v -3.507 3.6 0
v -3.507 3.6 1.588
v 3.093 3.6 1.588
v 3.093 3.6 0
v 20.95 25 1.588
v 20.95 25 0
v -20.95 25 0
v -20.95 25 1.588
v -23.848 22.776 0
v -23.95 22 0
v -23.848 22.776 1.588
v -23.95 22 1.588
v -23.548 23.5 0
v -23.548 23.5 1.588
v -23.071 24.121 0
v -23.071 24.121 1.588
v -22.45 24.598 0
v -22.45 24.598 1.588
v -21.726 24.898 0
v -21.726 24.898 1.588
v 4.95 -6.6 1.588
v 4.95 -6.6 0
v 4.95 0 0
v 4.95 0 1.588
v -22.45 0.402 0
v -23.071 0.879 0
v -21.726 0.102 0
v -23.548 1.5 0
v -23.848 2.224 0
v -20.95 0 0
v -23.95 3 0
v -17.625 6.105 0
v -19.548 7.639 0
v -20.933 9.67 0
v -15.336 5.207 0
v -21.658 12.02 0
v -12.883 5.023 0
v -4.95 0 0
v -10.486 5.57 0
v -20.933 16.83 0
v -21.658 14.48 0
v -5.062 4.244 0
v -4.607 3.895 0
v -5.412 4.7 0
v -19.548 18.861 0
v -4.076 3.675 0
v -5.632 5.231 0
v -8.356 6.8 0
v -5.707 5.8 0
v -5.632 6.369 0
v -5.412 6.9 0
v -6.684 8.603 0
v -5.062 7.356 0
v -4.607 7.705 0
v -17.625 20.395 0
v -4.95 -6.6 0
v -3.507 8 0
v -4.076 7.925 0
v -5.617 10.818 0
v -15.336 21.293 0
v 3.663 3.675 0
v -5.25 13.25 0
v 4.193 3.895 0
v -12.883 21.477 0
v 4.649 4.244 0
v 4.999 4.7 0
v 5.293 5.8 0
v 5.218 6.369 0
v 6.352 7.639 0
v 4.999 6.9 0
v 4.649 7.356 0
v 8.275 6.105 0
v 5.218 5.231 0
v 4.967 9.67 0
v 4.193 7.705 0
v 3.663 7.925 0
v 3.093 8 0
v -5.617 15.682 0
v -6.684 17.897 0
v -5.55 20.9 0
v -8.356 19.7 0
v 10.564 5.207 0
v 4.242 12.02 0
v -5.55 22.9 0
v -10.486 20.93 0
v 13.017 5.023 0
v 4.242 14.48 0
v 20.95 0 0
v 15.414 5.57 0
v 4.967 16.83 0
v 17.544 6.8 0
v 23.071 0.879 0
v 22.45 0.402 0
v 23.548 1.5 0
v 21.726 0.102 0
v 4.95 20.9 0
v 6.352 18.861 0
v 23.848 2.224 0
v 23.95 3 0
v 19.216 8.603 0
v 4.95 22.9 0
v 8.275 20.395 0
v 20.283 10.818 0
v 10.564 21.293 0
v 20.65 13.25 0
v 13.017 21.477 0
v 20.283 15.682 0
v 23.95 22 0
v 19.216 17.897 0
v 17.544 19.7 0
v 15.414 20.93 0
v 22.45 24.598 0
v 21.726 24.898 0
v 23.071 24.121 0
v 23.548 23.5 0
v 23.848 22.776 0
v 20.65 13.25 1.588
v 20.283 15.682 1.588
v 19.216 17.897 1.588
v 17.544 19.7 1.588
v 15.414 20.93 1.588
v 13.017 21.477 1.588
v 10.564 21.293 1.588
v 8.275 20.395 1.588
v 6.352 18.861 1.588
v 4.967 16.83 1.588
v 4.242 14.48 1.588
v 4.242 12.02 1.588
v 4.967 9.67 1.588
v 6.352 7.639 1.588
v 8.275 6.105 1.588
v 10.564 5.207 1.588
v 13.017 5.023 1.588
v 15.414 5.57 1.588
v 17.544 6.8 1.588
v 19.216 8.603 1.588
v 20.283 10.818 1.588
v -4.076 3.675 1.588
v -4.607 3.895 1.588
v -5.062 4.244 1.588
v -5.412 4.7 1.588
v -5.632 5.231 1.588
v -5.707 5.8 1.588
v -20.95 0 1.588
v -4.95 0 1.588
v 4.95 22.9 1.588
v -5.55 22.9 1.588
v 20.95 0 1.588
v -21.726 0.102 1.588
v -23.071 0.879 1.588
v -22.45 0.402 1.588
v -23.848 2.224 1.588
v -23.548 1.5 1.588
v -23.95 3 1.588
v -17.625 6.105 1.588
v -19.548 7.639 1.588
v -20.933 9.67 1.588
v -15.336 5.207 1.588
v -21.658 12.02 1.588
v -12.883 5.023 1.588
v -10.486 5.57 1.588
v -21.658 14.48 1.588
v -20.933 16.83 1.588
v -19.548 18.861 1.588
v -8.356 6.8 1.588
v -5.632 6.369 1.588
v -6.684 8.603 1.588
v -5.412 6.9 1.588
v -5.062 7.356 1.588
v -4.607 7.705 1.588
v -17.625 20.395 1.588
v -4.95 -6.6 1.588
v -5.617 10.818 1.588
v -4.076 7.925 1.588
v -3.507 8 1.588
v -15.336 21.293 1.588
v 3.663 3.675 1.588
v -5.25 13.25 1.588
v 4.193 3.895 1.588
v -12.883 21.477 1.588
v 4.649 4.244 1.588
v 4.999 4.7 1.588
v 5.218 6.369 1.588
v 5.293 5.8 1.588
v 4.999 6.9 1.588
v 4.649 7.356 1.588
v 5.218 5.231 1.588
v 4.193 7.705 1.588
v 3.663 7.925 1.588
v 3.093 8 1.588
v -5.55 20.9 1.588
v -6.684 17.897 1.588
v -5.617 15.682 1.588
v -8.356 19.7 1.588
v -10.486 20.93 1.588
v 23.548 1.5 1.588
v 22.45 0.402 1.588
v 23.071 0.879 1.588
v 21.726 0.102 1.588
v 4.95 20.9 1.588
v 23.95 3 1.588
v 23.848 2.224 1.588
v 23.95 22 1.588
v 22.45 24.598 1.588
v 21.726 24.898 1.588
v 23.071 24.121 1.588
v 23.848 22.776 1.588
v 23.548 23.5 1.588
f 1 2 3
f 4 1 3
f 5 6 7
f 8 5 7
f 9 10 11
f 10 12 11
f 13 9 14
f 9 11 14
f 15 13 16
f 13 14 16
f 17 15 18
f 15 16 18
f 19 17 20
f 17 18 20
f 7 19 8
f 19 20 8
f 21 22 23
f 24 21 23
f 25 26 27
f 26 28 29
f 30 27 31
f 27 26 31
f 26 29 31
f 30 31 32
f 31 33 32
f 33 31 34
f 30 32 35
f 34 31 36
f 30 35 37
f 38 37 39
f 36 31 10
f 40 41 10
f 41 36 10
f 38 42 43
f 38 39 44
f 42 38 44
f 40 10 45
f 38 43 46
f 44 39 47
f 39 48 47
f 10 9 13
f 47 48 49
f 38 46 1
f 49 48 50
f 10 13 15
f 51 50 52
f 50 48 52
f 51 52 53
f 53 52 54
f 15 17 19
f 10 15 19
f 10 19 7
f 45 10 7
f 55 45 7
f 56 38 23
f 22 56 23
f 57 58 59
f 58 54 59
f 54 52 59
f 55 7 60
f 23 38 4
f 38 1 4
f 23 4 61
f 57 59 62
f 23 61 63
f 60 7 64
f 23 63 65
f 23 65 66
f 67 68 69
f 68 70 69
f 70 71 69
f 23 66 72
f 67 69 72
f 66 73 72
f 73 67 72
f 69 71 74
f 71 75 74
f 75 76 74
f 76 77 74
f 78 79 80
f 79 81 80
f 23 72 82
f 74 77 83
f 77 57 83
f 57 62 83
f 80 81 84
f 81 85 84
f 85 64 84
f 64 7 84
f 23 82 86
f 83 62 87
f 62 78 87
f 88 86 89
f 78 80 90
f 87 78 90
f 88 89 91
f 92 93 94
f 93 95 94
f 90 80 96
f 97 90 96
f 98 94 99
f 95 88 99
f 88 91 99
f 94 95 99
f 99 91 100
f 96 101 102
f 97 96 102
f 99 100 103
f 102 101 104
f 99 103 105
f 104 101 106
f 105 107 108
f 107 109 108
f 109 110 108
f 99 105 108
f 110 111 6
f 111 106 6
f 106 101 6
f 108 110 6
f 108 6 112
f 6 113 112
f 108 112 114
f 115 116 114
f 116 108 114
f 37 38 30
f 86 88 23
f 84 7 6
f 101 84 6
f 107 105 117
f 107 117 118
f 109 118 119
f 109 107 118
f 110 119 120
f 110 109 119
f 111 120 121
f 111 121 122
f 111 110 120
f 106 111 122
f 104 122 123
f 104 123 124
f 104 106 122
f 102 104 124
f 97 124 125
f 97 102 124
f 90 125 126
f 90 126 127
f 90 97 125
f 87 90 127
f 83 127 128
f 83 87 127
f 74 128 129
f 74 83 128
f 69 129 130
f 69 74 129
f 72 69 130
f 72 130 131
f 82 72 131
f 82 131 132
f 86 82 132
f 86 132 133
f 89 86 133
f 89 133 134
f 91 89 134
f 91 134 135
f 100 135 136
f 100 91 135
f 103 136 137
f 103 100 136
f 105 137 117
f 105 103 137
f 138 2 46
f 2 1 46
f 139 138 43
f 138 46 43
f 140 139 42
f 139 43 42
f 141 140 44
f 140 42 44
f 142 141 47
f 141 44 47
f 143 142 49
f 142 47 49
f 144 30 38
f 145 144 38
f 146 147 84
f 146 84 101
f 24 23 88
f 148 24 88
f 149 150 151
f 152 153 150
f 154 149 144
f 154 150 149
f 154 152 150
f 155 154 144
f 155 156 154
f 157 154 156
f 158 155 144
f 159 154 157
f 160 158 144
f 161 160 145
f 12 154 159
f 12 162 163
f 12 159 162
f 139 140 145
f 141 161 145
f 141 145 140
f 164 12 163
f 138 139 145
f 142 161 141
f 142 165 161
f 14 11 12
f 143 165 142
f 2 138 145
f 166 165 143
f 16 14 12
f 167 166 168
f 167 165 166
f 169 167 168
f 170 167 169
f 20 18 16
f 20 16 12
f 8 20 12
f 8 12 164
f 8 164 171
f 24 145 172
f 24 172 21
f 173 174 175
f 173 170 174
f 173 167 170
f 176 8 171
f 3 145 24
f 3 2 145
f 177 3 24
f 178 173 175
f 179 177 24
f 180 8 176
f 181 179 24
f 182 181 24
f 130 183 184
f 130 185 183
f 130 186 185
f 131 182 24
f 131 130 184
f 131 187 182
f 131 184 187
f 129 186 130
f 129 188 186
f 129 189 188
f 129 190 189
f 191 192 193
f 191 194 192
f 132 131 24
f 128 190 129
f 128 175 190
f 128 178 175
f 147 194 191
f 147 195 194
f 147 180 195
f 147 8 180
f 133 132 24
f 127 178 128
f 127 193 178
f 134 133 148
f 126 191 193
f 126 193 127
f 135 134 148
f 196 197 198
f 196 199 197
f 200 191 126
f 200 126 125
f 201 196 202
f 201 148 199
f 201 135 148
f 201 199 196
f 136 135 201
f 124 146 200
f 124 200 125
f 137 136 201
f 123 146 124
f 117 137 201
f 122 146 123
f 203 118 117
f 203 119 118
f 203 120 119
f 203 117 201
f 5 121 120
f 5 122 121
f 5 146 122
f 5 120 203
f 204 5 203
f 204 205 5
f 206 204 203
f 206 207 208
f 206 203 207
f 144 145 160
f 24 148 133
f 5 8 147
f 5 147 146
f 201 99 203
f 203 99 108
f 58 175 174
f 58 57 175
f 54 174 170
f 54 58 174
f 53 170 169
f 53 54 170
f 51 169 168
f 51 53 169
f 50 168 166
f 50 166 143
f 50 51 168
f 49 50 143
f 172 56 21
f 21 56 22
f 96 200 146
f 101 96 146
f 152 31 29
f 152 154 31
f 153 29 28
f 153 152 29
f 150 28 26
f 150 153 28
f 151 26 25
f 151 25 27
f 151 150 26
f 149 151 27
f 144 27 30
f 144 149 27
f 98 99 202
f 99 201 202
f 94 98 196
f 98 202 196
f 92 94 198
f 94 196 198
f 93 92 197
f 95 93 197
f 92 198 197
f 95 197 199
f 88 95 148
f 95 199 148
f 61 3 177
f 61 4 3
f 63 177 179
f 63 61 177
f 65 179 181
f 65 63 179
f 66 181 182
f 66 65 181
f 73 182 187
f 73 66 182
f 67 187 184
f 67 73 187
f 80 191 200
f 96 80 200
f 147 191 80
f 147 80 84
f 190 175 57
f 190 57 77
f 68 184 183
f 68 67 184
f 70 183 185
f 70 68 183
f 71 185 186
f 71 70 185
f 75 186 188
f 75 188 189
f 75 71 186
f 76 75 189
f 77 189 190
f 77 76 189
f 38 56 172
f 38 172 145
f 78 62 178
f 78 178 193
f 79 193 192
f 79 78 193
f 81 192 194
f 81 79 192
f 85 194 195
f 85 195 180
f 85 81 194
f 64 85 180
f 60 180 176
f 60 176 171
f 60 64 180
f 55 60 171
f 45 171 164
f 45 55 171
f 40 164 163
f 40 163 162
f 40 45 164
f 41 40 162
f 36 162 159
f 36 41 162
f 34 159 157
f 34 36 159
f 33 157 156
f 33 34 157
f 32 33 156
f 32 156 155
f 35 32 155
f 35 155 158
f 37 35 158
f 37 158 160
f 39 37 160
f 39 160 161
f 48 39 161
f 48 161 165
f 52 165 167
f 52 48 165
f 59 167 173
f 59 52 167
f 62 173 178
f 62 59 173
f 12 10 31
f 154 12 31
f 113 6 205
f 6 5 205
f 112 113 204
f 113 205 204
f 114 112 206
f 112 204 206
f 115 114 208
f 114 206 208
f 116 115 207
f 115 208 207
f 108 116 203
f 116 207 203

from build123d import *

# Parameters (mm, degrees)
F2_R     = 8.25
F2_W     = 9.9
F2_H     = 6.6
F3_DEPTH = 1.5875
F4_W     = 11
F4_H     = 4.4
F4_W_2   = 10.5
F4_H_2   = 2
F5_DEPTH = 1.5885
F6_R     = 3
F7_R     = 2.19999


# Not quite as in the source:
# - a fillet or chamfer is up to 0.001 mm smaller than in the source, because OpenCascade refuses the exact size


with BuildPart() as f3:
    # F2 (on Top) → F3 (new body)
    with BuildSketch(Plane.XY):
        Polygon((-23.95, 25), (-23.95, 0), (-4.95, 0), (4.95, 0), (23.95, 0), (23.95, 25), align=None)
        with Locations((-13.5, 13.25)):
            Circle(F2_R, mode=Mode.SUBTRACT)
        with Locations((12.4, 13.25)):
            Circle(F2_R, mode=Mode.SUBTRACT)
        with Locations((0, -3.3)):
            Rectangle(F2_W, F2_H)
    extrude(amount=F3_DEPTH)

    # F4 (on face) → F5 (cut, through all)
    with BuildSketch(Plane.XY.offset(1.5875)):
        with Locations((-0.2067205198, 5.8)):
            Rectangle(F4_W, F4_H)
        with Locations((-0.3, 21.9)):
            Rectangle(F4_W_2, F4_H_2)
    extrude(amount=-F5_DEPTH, mode=Mode.SUBTRACT)

    # F6
    f6_edges = [f3.edges().sort_by_distance(p)[0] for p in [
        (-23.95, 0, 0.79375),
        (-23.95, 25, 0.79375),
        (23.95, 25, 0.79375),
        (23.95, 0, 0.79375),
    ]]
    fillet(f6_edges, radius=F6_R)

    # F7 (radius 2.2 in the source; OpenCascade refuses exactly that, so slightly less here)
    f7_edges = [f3.edges().sort_by_distance(p)[0] for p in [
        (-5.706721, 3.6, 0.79375),
        (-5.706721, 8, 0.79375),
        (5.293279, 3.6, 0.79375),
        (5.293279, 8, 0.79375),
    ]]
    fillet(f7_edges, radius=F7_R)


solid = f3.part
